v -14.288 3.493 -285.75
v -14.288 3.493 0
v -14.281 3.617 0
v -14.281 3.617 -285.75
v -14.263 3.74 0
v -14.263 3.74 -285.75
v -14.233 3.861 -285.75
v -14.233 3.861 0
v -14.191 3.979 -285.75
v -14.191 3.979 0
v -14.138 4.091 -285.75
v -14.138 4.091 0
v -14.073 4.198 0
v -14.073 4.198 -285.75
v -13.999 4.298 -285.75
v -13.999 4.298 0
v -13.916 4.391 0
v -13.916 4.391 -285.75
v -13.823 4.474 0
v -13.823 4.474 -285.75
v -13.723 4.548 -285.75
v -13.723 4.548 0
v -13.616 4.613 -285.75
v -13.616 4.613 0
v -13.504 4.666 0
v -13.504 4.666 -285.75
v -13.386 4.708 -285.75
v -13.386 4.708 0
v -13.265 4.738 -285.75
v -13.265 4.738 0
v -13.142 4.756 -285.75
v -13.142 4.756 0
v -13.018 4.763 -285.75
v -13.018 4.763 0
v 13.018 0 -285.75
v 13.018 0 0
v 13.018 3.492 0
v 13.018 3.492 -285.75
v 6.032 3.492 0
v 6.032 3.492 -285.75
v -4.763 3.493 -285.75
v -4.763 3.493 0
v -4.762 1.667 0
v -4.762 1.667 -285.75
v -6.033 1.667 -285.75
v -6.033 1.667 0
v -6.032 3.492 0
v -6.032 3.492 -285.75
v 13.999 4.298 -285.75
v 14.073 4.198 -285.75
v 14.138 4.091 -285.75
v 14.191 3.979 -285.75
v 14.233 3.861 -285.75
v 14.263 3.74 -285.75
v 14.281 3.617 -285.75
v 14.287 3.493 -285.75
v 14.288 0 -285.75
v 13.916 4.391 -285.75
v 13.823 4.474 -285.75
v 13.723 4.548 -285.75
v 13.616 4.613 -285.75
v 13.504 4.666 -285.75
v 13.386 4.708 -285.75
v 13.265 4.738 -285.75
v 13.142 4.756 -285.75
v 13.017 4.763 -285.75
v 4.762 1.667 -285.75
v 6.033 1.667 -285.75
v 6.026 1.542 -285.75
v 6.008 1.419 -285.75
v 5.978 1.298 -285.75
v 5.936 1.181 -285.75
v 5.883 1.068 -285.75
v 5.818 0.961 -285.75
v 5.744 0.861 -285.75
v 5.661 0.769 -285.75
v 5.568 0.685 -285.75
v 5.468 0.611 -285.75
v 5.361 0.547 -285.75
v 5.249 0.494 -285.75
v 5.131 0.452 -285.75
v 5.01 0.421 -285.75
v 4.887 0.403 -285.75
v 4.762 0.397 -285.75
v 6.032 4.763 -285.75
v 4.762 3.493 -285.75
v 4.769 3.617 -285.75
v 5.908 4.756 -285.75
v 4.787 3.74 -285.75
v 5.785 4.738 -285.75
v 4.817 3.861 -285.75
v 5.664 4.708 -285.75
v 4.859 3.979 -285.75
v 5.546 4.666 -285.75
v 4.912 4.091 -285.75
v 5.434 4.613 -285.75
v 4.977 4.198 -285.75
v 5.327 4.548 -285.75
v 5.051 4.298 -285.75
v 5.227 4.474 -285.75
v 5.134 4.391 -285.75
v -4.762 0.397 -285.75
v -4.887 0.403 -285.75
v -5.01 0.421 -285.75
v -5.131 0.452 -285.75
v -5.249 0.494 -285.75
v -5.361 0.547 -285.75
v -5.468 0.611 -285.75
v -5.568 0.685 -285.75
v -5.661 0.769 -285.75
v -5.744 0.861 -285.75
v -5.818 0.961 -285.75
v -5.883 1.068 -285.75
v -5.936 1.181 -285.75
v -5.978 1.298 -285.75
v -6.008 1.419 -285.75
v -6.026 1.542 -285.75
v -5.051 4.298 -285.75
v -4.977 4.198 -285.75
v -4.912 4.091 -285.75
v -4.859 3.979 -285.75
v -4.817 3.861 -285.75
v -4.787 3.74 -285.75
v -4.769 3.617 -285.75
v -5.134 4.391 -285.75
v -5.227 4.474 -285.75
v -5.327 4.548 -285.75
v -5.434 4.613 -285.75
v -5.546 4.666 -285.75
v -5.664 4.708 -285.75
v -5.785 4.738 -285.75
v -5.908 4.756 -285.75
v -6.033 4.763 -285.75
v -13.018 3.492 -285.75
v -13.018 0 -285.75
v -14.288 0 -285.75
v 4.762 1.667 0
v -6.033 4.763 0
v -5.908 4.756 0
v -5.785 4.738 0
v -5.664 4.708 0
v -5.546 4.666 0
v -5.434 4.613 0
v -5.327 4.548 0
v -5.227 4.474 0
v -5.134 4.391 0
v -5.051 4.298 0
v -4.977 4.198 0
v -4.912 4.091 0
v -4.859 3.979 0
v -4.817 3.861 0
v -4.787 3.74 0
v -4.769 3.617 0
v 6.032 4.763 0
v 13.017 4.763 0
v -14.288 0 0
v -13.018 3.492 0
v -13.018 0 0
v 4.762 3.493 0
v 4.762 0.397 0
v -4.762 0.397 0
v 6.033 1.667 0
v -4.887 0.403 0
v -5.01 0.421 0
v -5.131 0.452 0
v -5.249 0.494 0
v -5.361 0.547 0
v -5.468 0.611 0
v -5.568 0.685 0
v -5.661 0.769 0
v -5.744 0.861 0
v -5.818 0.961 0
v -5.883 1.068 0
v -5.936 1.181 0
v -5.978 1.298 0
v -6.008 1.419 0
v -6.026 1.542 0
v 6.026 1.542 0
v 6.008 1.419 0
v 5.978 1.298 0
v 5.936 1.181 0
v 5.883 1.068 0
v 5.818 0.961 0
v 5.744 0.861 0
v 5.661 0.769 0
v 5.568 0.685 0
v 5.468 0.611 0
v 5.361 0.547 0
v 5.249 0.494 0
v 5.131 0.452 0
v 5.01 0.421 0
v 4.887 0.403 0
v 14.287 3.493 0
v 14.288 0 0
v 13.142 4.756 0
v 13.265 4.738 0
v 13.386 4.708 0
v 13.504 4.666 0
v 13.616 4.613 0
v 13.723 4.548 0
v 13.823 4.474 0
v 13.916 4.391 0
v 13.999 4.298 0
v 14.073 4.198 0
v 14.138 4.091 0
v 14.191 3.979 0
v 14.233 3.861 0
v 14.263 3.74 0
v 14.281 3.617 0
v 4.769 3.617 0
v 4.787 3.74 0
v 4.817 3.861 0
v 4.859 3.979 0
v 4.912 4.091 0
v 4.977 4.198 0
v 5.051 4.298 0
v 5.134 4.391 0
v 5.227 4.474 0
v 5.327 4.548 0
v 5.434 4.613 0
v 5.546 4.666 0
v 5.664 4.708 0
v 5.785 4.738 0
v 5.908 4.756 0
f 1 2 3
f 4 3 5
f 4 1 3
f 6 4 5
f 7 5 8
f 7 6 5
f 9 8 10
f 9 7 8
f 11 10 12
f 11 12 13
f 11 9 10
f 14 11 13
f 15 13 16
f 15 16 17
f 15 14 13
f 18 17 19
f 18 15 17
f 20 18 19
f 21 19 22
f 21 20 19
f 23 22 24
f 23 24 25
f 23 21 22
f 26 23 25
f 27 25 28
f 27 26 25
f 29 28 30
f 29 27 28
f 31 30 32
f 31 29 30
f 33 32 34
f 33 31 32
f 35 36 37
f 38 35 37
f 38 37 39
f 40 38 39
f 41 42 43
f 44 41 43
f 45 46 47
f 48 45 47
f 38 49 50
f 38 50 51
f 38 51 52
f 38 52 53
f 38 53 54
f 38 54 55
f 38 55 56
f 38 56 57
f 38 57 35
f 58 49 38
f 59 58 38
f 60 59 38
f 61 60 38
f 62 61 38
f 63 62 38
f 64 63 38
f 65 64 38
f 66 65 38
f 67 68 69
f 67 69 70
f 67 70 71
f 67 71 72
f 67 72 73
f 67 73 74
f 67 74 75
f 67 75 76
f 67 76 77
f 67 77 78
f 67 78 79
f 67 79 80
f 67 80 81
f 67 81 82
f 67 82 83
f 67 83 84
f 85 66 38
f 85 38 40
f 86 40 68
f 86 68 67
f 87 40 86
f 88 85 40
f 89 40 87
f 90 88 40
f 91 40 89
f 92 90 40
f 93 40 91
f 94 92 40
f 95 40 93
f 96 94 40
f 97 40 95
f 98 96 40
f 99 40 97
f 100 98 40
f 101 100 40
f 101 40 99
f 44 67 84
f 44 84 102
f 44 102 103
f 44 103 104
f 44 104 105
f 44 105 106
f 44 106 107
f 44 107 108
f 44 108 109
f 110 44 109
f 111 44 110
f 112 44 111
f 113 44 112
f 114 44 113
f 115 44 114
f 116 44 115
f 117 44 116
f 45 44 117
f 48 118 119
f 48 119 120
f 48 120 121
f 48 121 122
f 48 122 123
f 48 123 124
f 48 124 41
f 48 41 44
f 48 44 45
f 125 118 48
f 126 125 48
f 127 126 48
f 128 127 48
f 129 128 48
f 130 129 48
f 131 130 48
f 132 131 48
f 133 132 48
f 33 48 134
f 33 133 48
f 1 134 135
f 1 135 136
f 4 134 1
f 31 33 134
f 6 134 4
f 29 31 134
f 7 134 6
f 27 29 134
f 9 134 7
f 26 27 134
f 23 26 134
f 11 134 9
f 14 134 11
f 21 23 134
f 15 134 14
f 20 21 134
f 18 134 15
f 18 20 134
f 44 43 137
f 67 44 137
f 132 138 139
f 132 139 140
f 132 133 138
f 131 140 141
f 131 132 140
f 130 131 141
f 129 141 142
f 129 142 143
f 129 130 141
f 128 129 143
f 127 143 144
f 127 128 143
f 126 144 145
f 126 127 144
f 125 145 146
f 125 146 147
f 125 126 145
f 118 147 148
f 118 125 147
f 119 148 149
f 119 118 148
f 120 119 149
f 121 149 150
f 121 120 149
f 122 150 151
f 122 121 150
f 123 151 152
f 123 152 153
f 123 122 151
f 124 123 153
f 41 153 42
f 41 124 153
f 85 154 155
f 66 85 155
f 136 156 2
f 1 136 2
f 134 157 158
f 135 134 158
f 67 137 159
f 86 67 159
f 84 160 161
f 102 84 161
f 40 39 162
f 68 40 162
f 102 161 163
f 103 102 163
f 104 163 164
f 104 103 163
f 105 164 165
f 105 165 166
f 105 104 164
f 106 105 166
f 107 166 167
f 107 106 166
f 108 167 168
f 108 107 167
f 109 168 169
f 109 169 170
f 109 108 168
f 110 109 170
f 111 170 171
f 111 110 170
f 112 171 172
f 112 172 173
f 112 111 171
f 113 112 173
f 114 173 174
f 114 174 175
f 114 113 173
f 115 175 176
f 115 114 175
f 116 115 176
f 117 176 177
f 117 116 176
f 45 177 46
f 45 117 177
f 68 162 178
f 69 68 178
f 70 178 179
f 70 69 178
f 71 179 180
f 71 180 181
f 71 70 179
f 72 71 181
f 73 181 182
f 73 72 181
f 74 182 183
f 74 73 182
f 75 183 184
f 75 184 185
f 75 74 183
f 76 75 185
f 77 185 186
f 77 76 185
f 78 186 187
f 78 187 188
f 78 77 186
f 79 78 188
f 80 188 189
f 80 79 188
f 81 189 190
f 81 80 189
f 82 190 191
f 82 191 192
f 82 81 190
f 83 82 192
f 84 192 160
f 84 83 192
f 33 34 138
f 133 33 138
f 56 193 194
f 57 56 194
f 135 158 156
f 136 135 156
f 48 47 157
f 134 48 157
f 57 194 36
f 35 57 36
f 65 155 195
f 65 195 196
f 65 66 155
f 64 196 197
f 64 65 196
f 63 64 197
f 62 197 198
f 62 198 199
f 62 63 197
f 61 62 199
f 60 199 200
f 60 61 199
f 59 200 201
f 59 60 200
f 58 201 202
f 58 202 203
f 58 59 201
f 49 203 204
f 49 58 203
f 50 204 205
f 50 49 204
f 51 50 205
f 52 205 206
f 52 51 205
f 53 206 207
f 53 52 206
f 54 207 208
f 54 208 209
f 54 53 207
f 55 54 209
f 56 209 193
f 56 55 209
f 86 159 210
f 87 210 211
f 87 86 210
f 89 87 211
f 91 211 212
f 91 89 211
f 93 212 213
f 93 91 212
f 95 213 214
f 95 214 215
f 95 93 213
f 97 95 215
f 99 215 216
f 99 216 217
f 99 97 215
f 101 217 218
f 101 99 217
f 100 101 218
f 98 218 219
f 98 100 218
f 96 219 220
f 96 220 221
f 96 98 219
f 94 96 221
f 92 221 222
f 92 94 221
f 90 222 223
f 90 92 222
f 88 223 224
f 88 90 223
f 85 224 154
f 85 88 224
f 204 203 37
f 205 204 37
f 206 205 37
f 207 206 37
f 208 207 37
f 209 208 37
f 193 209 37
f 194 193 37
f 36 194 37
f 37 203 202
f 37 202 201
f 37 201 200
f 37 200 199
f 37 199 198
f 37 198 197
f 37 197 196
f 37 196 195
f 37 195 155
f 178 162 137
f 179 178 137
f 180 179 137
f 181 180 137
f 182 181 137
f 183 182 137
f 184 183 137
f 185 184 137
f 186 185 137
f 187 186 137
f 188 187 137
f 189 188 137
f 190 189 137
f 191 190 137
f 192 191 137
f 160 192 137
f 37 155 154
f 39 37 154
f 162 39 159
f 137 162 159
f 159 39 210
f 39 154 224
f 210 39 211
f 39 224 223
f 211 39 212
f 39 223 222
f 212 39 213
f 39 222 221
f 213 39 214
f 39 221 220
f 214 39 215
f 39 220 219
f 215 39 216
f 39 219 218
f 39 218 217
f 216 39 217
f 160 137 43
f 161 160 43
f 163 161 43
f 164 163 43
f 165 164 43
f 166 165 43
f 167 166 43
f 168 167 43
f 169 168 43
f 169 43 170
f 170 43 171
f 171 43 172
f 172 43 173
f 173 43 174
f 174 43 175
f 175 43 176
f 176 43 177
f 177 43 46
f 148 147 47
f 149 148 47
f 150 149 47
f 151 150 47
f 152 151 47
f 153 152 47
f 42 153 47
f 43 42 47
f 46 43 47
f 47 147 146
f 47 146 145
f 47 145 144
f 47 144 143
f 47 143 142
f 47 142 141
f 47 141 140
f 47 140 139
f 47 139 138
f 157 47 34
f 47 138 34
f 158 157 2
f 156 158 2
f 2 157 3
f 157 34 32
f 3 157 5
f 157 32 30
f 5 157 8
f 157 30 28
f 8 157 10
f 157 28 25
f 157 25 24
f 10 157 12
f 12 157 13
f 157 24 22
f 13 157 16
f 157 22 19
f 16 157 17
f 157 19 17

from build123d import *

# Parameters (mm, degrees)
EXTRUDE_THIN1_DEPTH = 285.75
FILLET1_R           = 1.27


with BuildPart() as part:
    # Sketch1 → Extrude-Thin1 (new body)
    with BuildSketch(Plane.XY):
        Polygon((-14.2875, 0), (-14.2875, 4.7625), (-4.7625, 4.7625), (-4.7625, 1.666875), (4.7625, 1.666875), (4.7625, 4.7625), (14.2875, 4.7625), (14.2875, 0), (13.0175, 0), (13.0175, 3.4925), (6.0325, 3.4925), (6.0325, 0.396875), (-6.0325, 0.396875), (-6.0325, 3.4925), (-13.0175, 3.4925), (-13.0175, 0), align=None)
    extrude(amount=-EXTRUDE_THIN1_DEPTH)

    # Fillet1
    fillet1_edges = [part.edges().sort_by_distance(p)[0] for p in [
        (-14.2875, 4.7625, -142.875),
        (-4.7625, 4.7625, -142.875),
        (4.7625, 4.7625, -142.875),
        (14.2875, 4.7625, -142.875),
        (6.0325, 0.396875, -142.875),
        (-6.0325, 0.396875, -142.875),
    ]]
    fillet(fillet1_edges, radius=FILLET1_R)


solid = part.part
